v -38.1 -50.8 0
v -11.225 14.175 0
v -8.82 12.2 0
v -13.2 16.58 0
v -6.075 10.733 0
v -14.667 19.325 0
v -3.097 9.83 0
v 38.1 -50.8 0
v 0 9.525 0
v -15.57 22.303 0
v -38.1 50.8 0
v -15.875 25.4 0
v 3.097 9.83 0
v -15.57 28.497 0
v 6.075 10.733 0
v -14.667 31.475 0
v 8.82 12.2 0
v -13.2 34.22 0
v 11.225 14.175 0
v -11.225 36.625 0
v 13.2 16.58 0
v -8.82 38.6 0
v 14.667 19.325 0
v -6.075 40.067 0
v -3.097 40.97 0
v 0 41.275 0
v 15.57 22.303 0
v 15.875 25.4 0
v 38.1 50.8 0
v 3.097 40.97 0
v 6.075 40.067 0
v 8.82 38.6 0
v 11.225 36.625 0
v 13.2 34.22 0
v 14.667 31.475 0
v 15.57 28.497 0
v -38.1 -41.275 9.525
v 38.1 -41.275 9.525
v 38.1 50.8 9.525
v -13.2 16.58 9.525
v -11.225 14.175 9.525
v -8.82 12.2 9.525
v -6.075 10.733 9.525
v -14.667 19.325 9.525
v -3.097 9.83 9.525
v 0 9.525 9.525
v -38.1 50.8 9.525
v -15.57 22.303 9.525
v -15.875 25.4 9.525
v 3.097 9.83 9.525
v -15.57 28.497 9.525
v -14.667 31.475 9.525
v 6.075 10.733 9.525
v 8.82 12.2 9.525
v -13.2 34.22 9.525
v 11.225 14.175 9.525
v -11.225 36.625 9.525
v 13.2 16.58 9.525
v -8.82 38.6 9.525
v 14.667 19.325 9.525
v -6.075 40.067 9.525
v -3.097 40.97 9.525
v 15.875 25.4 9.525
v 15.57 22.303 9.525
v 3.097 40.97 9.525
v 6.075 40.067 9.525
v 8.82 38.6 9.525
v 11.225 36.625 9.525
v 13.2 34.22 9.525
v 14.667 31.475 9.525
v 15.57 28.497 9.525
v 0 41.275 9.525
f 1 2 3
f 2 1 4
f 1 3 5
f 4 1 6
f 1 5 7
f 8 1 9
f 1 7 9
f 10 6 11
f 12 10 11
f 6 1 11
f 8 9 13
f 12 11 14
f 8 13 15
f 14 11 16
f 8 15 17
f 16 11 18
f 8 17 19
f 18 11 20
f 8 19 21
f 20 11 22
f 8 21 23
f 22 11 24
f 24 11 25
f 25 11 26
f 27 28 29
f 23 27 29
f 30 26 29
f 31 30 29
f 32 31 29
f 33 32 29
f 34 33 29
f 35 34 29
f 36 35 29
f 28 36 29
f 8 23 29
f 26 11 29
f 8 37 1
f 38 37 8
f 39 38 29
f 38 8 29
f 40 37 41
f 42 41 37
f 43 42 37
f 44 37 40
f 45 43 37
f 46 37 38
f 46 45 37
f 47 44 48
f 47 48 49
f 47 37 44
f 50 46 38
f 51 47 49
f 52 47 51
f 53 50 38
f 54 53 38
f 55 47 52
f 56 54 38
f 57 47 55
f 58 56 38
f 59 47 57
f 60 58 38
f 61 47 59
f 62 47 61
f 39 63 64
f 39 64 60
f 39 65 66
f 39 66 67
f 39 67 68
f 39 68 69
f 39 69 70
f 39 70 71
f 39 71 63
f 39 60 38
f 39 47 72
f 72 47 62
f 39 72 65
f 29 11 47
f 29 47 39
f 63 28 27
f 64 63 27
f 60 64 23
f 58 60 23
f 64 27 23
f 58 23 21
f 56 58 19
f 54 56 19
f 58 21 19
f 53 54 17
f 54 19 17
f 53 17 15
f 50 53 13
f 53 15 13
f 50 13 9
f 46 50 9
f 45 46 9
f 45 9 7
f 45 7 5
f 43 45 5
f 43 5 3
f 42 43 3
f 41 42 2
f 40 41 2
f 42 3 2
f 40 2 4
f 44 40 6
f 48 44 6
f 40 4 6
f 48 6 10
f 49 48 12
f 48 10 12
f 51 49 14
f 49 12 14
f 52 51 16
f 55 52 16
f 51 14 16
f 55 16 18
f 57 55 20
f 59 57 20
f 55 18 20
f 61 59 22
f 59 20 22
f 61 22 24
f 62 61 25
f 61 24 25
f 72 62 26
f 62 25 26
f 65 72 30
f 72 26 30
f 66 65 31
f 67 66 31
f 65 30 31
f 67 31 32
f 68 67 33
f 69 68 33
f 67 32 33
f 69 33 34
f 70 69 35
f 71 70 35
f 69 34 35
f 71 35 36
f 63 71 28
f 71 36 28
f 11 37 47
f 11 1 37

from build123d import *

# Parameters (mm, degrees)
F0_W     = 76.2
F0_H     = 101.6
F1_DEPTH = 9.525
F2_SIZE  = 9.52499
F3_R     = 15.875
F4_DEPTH = 9.525


# Not quite as in the source:
# - a fillet or chamfer is up to 0.001 mm smaller than in the source, because OpenCascade refuses the exact size


with BuildPart() as f1:
    # F0 (on Top) → F1 (new body)
    with BuildSketch(Plane.XY):
        Rectangle(F0_W, F0_H)
    extrude(amount=F1_DEPTH)

    # F2 (size 9.525 in the source; OpenCascade refuses exactly that, so slightly less here)
    f2_edges = [f1.edges().sort_by_distance(p)[0] for p in [
        (0, -50.8, 9.525),
    ]]
    chamfer(f2_edges, length=F2_SIZE)

    # F3 (on face) → F4 (cut)
    with BuildSketch(Plane(origin=(0, 0, 0), x_dir=(1, 0, 0), z_dir=(0, 0, -1))):
        with Locations((0, -25.4)):
            Circle(F3_R)
    extrude(amount=-F4_DEPTH, mode=Mode.SUBTRACT)


solid = f1.part
